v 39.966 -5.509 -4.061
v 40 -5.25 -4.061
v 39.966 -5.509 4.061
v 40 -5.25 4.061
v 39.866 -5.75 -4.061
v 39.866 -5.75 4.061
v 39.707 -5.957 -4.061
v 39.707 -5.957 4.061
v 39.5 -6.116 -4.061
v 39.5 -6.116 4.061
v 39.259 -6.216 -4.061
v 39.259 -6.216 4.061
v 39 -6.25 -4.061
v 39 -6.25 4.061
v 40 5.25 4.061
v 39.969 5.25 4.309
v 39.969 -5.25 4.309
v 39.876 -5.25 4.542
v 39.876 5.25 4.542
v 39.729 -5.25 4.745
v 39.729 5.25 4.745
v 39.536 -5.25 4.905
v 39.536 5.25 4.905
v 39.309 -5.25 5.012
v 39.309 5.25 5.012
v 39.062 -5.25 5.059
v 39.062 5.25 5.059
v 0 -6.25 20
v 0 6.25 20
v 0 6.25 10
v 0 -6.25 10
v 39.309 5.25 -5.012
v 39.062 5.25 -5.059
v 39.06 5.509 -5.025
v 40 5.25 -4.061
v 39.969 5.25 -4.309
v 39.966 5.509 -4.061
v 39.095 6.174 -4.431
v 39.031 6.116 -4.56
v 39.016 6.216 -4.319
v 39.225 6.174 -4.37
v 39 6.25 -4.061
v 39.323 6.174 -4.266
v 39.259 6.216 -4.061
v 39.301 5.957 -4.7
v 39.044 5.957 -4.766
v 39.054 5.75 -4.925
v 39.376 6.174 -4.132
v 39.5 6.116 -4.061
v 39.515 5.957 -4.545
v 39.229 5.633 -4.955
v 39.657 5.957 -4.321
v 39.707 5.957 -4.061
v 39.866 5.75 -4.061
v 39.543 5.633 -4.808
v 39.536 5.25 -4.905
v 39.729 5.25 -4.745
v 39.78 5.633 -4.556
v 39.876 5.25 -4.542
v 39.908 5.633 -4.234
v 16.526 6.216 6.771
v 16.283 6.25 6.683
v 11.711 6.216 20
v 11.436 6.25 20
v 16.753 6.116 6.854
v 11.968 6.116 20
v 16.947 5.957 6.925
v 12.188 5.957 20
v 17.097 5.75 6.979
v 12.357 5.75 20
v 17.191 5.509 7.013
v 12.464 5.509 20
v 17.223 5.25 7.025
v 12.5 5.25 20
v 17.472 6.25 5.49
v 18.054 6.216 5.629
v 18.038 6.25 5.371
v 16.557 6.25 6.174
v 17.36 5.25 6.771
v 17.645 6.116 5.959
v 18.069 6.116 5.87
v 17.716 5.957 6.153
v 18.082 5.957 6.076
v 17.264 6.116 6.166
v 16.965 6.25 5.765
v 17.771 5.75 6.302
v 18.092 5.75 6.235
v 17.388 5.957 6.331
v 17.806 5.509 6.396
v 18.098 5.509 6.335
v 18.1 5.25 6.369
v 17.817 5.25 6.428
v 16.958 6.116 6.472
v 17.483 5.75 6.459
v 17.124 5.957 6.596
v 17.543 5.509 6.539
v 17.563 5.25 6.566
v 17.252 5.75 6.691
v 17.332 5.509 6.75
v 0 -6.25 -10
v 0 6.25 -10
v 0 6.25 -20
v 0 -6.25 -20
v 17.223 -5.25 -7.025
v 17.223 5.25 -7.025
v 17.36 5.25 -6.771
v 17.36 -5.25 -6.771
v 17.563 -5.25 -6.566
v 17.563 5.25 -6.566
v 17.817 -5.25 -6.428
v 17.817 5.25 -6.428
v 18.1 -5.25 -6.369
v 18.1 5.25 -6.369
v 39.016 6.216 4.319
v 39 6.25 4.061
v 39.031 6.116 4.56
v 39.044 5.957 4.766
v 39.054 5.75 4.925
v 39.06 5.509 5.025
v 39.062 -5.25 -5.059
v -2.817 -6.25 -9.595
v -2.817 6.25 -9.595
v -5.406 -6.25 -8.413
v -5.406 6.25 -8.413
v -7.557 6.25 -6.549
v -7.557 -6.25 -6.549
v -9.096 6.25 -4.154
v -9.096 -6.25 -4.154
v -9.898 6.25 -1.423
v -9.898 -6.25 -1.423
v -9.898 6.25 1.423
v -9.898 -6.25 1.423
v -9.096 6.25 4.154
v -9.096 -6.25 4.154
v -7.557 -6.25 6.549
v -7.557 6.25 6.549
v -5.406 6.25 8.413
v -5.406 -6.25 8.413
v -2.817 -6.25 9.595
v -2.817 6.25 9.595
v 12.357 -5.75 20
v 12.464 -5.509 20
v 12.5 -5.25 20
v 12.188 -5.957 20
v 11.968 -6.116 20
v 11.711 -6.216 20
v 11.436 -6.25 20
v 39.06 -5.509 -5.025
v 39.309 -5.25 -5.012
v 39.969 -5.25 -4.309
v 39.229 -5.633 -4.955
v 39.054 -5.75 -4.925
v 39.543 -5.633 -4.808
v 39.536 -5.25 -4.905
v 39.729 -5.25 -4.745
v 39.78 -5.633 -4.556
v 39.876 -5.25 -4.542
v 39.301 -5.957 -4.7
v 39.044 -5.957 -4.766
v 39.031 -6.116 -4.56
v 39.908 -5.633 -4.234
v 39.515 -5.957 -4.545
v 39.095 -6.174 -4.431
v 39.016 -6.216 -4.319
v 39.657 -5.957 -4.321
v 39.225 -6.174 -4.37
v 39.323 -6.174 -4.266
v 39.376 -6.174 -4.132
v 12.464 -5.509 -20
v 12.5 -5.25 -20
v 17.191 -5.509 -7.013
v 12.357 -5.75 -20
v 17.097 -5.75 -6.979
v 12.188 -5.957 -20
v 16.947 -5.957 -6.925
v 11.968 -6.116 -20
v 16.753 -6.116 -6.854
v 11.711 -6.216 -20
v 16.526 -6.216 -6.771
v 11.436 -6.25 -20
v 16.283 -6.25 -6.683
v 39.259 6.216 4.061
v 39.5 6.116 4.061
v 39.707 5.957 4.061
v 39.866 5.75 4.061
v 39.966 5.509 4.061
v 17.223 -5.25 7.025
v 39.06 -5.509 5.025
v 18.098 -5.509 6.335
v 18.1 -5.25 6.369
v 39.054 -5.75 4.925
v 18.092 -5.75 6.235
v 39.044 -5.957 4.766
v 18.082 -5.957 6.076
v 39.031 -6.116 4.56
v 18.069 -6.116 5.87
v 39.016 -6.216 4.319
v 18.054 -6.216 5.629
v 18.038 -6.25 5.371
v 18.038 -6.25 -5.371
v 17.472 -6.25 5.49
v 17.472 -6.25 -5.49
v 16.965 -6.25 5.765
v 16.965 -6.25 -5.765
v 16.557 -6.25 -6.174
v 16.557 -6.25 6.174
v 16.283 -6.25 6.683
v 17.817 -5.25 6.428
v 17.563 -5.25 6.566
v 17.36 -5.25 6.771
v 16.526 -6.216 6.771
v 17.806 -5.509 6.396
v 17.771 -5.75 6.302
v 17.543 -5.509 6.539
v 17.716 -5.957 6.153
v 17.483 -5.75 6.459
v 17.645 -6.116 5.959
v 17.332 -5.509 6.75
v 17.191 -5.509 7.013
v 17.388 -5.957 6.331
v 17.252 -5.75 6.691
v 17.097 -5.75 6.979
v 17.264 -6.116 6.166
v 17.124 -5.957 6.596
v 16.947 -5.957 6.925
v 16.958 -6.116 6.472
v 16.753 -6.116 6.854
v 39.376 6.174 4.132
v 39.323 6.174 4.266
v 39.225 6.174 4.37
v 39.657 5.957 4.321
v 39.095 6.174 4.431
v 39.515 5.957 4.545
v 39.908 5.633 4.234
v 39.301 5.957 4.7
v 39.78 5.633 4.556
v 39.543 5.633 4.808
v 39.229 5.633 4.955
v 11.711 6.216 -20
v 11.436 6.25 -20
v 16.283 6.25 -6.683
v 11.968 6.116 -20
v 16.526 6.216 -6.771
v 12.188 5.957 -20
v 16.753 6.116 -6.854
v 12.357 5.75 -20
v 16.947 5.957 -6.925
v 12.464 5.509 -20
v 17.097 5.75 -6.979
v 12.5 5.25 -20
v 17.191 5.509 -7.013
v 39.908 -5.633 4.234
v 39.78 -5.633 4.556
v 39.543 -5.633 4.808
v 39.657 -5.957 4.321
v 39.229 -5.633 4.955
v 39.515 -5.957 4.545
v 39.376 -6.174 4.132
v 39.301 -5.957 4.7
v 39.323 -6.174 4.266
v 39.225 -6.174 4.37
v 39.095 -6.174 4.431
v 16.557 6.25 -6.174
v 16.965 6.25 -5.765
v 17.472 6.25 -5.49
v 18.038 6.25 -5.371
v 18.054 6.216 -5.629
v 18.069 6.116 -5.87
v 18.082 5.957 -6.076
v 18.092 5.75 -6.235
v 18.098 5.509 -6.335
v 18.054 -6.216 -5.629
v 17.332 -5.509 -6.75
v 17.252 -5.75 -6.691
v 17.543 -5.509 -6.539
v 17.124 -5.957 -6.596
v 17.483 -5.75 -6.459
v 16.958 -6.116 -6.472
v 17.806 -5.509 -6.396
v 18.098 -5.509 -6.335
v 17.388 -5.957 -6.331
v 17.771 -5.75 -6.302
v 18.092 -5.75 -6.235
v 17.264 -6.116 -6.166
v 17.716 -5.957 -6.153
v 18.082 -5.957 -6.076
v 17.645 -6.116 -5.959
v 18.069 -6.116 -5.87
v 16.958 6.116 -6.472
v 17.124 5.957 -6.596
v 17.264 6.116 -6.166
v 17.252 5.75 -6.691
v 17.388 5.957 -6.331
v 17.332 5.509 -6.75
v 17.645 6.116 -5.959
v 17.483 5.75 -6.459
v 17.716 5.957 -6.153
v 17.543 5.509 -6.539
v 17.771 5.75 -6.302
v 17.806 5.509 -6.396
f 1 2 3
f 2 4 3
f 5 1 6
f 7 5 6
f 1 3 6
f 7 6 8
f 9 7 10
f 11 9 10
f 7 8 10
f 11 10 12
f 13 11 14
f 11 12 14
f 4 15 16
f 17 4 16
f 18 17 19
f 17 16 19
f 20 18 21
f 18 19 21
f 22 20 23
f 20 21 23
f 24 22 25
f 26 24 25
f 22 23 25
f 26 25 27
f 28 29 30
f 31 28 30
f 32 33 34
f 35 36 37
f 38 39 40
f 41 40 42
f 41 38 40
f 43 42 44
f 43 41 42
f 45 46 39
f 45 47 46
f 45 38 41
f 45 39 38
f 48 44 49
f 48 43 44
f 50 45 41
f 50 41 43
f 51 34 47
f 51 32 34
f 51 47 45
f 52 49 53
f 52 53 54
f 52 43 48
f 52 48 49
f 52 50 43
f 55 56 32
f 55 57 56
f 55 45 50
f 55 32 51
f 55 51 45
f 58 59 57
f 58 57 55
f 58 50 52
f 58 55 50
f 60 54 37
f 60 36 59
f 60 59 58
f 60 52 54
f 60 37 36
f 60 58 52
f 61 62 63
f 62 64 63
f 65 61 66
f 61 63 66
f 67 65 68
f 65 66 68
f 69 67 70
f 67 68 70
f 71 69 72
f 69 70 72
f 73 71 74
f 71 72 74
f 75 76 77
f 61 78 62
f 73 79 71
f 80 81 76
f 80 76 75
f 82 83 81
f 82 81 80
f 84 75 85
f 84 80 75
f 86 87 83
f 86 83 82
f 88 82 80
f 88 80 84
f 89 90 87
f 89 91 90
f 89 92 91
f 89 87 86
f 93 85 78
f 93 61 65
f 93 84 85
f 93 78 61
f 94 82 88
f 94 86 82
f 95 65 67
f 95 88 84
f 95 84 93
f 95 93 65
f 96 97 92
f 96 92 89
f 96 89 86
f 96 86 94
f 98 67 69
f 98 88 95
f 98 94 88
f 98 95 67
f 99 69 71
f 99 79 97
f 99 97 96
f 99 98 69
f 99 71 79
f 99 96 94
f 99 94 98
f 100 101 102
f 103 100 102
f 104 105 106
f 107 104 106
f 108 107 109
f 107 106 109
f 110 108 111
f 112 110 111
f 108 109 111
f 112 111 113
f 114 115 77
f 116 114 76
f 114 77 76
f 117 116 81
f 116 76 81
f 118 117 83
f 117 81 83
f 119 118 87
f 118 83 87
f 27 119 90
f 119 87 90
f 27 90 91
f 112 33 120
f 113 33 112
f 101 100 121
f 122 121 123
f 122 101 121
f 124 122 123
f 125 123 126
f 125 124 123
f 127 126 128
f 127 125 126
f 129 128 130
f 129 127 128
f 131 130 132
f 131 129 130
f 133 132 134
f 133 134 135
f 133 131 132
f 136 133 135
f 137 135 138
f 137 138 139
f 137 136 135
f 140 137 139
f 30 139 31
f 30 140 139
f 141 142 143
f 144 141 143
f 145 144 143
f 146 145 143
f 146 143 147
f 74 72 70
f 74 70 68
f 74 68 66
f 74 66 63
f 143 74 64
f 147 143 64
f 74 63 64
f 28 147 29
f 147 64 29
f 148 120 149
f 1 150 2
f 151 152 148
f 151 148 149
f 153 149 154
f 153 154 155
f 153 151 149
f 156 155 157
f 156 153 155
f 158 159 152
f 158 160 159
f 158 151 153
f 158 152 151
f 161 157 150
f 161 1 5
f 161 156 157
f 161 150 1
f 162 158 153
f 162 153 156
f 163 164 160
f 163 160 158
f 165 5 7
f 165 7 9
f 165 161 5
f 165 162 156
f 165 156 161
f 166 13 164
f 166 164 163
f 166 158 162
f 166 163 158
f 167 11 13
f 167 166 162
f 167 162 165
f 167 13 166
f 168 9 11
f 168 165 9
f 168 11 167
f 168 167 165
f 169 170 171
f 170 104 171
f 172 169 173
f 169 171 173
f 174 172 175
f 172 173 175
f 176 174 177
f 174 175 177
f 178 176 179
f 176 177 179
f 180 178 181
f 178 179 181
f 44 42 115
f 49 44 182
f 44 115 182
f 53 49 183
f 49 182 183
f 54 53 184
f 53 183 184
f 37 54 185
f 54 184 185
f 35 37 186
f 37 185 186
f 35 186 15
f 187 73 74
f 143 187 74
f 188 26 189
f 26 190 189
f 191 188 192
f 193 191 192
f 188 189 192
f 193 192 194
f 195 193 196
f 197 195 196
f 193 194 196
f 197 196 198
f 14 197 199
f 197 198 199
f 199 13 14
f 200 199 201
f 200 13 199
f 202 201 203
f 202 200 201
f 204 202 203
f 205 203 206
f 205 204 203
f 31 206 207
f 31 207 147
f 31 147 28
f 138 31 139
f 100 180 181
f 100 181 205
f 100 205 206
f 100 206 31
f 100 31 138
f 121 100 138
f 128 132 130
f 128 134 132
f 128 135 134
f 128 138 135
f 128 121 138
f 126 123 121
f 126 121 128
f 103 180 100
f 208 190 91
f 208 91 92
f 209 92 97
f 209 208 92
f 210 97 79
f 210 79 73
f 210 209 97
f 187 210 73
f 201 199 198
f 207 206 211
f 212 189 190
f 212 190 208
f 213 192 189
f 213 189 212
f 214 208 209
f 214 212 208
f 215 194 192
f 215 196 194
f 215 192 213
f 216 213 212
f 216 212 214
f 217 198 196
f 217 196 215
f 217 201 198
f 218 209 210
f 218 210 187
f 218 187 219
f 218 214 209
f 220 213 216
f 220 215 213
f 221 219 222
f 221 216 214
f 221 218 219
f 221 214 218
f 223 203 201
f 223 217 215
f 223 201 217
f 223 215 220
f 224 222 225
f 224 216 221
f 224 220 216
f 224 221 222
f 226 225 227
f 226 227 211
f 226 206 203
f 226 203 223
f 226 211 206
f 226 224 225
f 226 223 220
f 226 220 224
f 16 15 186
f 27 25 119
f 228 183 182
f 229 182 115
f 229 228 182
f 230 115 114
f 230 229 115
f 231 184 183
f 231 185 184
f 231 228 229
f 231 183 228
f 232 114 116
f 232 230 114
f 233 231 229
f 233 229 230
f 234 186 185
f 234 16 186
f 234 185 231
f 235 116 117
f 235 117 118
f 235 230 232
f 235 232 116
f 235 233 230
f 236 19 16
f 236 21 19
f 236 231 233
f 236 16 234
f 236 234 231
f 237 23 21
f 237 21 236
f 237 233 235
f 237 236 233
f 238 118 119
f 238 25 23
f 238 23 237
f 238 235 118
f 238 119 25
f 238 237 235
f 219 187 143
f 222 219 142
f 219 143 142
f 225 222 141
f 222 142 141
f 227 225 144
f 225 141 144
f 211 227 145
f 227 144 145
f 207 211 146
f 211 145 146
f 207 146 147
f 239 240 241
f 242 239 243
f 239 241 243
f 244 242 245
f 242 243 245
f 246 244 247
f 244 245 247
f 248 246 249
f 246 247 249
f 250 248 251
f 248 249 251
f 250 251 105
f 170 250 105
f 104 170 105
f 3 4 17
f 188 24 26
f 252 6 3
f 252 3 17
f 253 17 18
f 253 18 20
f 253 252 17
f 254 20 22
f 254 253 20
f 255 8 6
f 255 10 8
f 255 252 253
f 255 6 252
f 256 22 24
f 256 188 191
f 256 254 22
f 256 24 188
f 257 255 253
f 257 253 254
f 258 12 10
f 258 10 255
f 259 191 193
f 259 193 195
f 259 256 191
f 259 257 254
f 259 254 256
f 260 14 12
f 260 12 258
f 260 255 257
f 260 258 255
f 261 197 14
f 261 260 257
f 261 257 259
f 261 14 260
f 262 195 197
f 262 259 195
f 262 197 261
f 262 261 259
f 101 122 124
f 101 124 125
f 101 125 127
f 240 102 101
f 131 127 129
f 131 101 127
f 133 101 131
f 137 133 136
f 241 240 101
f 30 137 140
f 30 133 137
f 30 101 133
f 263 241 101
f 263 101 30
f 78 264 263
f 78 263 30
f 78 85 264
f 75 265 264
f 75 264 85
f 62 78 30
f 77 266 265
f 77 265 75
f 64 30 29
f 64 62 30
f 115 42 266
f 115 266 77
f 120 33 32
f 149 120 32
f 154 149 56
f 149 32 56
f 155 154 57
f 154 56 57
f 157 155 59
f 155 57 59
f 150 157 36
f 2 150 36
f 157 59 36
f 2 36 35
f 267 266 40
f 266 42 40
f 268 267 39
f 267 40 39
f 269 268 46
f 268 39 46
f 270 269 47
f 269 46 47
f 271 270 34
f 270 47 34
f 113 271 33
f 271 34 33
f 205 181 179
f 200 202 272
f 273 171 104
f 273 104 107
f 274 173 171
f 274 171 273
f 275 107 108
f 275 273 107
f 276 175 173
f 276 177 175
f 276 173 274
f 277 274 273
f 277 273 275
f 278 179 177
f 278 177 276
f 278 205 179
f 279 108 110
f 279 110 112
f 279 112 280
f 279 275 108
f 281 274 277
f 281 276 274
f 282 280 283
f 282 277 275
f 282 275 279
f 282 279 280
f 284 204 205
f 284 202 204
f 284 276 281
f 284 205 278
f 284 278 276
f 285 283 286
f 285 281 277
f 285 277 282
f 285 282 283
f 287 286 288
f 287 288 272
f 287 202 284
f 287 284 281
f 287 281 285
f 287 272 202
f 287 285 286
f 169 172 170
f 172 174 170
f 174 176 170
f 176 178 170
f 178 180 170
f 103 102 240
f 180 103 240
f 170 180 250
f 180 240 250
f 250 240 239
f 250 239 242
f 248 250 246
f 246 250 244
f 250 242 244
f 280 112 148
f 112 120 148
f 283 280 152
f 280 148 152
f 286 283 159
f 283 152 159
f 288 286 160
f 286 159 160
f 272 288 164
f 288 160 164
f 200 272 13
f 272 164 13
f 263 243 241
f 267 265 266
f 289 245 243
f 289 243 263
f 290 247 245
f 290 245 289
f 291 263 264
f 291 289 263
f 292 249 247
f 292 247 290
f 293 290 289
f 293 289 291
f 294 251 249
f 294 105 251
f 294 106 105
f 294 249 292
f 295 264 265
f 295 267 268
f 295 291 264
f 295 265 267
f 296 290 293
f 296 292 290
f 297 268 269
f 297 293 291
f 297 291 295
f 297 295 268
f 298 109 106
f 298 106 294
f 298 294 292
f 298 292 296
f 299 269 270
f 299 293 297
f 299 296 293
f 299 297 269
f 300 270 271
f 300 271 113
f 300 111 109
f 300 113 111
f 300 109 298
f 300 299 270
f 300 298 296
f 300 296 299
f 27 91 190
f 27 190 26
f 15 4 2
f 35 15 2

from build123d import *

# Parameters (mm, degrees)
SKETCH1_R           = 10
BOSS_EXTRUDE1_DEPTH = 6.25
BOSS_EXTRUDE2_DEPTH = 6.25
BOSS_EXTRUDE5_DEPTH = 12.5
FILLET2_R           = 1
FILLET3_R           = 1


with BuildPart() as part:
    # Sketch1 → Boss-Extrude1 (new, symmetric)
    with BuildSketch(Plane(origin=(0, 0, 0), x_dir=(-1, 0, 0), z_dir=(0, 1, 0))):
        with Locations(Location((0, 0, 0), (0, 0, 90))):
            Circle(SKETCH1_R)
    extrude(amount=BOSS_EXTRUDE1_DEPTH, both=True)

    # Sketch2 → Boss-Extrude2 (add, symmetric)
    with BuildSketch(Plane(origin=(0, 0, 0), x_dir=(-1, 0, 0), z_dir=(0, 1, 0))):
        Polygon((0, 0), (0, 7.5), (-40, 5), (-40, -5), (0, -7.5), align=None)
    extrude(amount=BOSS_EXTRUDE2_DEPTH, both=True)

    # Sketch4 → Boss-Extrude5 (add, through all)
    with BuildSketch(Plane(origin=(0, 6.25, 0), x_dir=(1, 0, 0), z_dir=(0, 1, 0))):
        Polygon((19.779404685, 0), (12.5, -20), (0, -20), (0, 20), (12.5, 20), align=None)
    extrude(amount=-BOSS_EXTRUDE5_DEPTH)

    # Fillet2
    fillet2_edges = [part.edges().sort_by_distance(p)[0] for p in [
        (40, 0, -5),
        (40, 0, 5),
        (17.446503424, 0, -6.409593536),
        (17.446503424, 0, 6.409593536),
    ]]
    fillet(fillet2_edges, radius=FILLET2_R)

    # Fillet3
    fillet3_edges = [part.edges().sort_by_distance(p)[0] for p in [
        (14.86129541, -6.25, 13.512394182),
        (14.86129541, 6.25, 13.512394182),
        (28.58114172, 6.25, 5.713678643),
        (28.58114172, -6.25, 5.713678643),
        (28.58114172, -6.25, -5.713678643),
        (28.58114172, 6.25, -5.713678643),
        (14.86129541, -6.25, -13.512394182),
        (14.86129541, 6.25, -13.512394182),
        (40, -6.25, 0),
        (39.728827238, -6.25, 4.745246418),
        (39.728827238, -6.25, -4.745246418),
        (40, 6.25, 0),
        (39.728827238, 6.25, 4.745246418),
        (39.728827238, 6.25, -4.745246418),
        (17.563425222, -6.25, 6.565953441),
        (17.563425222, 6.25, 6.565953441),
        (17.563425222, 6.25, -6.565953441),
        (17.563425222, -6.25, -6.565953441),
    ]]
    fillet(fillet3_edges, radius=FILLET3_R)


solid = part.part
